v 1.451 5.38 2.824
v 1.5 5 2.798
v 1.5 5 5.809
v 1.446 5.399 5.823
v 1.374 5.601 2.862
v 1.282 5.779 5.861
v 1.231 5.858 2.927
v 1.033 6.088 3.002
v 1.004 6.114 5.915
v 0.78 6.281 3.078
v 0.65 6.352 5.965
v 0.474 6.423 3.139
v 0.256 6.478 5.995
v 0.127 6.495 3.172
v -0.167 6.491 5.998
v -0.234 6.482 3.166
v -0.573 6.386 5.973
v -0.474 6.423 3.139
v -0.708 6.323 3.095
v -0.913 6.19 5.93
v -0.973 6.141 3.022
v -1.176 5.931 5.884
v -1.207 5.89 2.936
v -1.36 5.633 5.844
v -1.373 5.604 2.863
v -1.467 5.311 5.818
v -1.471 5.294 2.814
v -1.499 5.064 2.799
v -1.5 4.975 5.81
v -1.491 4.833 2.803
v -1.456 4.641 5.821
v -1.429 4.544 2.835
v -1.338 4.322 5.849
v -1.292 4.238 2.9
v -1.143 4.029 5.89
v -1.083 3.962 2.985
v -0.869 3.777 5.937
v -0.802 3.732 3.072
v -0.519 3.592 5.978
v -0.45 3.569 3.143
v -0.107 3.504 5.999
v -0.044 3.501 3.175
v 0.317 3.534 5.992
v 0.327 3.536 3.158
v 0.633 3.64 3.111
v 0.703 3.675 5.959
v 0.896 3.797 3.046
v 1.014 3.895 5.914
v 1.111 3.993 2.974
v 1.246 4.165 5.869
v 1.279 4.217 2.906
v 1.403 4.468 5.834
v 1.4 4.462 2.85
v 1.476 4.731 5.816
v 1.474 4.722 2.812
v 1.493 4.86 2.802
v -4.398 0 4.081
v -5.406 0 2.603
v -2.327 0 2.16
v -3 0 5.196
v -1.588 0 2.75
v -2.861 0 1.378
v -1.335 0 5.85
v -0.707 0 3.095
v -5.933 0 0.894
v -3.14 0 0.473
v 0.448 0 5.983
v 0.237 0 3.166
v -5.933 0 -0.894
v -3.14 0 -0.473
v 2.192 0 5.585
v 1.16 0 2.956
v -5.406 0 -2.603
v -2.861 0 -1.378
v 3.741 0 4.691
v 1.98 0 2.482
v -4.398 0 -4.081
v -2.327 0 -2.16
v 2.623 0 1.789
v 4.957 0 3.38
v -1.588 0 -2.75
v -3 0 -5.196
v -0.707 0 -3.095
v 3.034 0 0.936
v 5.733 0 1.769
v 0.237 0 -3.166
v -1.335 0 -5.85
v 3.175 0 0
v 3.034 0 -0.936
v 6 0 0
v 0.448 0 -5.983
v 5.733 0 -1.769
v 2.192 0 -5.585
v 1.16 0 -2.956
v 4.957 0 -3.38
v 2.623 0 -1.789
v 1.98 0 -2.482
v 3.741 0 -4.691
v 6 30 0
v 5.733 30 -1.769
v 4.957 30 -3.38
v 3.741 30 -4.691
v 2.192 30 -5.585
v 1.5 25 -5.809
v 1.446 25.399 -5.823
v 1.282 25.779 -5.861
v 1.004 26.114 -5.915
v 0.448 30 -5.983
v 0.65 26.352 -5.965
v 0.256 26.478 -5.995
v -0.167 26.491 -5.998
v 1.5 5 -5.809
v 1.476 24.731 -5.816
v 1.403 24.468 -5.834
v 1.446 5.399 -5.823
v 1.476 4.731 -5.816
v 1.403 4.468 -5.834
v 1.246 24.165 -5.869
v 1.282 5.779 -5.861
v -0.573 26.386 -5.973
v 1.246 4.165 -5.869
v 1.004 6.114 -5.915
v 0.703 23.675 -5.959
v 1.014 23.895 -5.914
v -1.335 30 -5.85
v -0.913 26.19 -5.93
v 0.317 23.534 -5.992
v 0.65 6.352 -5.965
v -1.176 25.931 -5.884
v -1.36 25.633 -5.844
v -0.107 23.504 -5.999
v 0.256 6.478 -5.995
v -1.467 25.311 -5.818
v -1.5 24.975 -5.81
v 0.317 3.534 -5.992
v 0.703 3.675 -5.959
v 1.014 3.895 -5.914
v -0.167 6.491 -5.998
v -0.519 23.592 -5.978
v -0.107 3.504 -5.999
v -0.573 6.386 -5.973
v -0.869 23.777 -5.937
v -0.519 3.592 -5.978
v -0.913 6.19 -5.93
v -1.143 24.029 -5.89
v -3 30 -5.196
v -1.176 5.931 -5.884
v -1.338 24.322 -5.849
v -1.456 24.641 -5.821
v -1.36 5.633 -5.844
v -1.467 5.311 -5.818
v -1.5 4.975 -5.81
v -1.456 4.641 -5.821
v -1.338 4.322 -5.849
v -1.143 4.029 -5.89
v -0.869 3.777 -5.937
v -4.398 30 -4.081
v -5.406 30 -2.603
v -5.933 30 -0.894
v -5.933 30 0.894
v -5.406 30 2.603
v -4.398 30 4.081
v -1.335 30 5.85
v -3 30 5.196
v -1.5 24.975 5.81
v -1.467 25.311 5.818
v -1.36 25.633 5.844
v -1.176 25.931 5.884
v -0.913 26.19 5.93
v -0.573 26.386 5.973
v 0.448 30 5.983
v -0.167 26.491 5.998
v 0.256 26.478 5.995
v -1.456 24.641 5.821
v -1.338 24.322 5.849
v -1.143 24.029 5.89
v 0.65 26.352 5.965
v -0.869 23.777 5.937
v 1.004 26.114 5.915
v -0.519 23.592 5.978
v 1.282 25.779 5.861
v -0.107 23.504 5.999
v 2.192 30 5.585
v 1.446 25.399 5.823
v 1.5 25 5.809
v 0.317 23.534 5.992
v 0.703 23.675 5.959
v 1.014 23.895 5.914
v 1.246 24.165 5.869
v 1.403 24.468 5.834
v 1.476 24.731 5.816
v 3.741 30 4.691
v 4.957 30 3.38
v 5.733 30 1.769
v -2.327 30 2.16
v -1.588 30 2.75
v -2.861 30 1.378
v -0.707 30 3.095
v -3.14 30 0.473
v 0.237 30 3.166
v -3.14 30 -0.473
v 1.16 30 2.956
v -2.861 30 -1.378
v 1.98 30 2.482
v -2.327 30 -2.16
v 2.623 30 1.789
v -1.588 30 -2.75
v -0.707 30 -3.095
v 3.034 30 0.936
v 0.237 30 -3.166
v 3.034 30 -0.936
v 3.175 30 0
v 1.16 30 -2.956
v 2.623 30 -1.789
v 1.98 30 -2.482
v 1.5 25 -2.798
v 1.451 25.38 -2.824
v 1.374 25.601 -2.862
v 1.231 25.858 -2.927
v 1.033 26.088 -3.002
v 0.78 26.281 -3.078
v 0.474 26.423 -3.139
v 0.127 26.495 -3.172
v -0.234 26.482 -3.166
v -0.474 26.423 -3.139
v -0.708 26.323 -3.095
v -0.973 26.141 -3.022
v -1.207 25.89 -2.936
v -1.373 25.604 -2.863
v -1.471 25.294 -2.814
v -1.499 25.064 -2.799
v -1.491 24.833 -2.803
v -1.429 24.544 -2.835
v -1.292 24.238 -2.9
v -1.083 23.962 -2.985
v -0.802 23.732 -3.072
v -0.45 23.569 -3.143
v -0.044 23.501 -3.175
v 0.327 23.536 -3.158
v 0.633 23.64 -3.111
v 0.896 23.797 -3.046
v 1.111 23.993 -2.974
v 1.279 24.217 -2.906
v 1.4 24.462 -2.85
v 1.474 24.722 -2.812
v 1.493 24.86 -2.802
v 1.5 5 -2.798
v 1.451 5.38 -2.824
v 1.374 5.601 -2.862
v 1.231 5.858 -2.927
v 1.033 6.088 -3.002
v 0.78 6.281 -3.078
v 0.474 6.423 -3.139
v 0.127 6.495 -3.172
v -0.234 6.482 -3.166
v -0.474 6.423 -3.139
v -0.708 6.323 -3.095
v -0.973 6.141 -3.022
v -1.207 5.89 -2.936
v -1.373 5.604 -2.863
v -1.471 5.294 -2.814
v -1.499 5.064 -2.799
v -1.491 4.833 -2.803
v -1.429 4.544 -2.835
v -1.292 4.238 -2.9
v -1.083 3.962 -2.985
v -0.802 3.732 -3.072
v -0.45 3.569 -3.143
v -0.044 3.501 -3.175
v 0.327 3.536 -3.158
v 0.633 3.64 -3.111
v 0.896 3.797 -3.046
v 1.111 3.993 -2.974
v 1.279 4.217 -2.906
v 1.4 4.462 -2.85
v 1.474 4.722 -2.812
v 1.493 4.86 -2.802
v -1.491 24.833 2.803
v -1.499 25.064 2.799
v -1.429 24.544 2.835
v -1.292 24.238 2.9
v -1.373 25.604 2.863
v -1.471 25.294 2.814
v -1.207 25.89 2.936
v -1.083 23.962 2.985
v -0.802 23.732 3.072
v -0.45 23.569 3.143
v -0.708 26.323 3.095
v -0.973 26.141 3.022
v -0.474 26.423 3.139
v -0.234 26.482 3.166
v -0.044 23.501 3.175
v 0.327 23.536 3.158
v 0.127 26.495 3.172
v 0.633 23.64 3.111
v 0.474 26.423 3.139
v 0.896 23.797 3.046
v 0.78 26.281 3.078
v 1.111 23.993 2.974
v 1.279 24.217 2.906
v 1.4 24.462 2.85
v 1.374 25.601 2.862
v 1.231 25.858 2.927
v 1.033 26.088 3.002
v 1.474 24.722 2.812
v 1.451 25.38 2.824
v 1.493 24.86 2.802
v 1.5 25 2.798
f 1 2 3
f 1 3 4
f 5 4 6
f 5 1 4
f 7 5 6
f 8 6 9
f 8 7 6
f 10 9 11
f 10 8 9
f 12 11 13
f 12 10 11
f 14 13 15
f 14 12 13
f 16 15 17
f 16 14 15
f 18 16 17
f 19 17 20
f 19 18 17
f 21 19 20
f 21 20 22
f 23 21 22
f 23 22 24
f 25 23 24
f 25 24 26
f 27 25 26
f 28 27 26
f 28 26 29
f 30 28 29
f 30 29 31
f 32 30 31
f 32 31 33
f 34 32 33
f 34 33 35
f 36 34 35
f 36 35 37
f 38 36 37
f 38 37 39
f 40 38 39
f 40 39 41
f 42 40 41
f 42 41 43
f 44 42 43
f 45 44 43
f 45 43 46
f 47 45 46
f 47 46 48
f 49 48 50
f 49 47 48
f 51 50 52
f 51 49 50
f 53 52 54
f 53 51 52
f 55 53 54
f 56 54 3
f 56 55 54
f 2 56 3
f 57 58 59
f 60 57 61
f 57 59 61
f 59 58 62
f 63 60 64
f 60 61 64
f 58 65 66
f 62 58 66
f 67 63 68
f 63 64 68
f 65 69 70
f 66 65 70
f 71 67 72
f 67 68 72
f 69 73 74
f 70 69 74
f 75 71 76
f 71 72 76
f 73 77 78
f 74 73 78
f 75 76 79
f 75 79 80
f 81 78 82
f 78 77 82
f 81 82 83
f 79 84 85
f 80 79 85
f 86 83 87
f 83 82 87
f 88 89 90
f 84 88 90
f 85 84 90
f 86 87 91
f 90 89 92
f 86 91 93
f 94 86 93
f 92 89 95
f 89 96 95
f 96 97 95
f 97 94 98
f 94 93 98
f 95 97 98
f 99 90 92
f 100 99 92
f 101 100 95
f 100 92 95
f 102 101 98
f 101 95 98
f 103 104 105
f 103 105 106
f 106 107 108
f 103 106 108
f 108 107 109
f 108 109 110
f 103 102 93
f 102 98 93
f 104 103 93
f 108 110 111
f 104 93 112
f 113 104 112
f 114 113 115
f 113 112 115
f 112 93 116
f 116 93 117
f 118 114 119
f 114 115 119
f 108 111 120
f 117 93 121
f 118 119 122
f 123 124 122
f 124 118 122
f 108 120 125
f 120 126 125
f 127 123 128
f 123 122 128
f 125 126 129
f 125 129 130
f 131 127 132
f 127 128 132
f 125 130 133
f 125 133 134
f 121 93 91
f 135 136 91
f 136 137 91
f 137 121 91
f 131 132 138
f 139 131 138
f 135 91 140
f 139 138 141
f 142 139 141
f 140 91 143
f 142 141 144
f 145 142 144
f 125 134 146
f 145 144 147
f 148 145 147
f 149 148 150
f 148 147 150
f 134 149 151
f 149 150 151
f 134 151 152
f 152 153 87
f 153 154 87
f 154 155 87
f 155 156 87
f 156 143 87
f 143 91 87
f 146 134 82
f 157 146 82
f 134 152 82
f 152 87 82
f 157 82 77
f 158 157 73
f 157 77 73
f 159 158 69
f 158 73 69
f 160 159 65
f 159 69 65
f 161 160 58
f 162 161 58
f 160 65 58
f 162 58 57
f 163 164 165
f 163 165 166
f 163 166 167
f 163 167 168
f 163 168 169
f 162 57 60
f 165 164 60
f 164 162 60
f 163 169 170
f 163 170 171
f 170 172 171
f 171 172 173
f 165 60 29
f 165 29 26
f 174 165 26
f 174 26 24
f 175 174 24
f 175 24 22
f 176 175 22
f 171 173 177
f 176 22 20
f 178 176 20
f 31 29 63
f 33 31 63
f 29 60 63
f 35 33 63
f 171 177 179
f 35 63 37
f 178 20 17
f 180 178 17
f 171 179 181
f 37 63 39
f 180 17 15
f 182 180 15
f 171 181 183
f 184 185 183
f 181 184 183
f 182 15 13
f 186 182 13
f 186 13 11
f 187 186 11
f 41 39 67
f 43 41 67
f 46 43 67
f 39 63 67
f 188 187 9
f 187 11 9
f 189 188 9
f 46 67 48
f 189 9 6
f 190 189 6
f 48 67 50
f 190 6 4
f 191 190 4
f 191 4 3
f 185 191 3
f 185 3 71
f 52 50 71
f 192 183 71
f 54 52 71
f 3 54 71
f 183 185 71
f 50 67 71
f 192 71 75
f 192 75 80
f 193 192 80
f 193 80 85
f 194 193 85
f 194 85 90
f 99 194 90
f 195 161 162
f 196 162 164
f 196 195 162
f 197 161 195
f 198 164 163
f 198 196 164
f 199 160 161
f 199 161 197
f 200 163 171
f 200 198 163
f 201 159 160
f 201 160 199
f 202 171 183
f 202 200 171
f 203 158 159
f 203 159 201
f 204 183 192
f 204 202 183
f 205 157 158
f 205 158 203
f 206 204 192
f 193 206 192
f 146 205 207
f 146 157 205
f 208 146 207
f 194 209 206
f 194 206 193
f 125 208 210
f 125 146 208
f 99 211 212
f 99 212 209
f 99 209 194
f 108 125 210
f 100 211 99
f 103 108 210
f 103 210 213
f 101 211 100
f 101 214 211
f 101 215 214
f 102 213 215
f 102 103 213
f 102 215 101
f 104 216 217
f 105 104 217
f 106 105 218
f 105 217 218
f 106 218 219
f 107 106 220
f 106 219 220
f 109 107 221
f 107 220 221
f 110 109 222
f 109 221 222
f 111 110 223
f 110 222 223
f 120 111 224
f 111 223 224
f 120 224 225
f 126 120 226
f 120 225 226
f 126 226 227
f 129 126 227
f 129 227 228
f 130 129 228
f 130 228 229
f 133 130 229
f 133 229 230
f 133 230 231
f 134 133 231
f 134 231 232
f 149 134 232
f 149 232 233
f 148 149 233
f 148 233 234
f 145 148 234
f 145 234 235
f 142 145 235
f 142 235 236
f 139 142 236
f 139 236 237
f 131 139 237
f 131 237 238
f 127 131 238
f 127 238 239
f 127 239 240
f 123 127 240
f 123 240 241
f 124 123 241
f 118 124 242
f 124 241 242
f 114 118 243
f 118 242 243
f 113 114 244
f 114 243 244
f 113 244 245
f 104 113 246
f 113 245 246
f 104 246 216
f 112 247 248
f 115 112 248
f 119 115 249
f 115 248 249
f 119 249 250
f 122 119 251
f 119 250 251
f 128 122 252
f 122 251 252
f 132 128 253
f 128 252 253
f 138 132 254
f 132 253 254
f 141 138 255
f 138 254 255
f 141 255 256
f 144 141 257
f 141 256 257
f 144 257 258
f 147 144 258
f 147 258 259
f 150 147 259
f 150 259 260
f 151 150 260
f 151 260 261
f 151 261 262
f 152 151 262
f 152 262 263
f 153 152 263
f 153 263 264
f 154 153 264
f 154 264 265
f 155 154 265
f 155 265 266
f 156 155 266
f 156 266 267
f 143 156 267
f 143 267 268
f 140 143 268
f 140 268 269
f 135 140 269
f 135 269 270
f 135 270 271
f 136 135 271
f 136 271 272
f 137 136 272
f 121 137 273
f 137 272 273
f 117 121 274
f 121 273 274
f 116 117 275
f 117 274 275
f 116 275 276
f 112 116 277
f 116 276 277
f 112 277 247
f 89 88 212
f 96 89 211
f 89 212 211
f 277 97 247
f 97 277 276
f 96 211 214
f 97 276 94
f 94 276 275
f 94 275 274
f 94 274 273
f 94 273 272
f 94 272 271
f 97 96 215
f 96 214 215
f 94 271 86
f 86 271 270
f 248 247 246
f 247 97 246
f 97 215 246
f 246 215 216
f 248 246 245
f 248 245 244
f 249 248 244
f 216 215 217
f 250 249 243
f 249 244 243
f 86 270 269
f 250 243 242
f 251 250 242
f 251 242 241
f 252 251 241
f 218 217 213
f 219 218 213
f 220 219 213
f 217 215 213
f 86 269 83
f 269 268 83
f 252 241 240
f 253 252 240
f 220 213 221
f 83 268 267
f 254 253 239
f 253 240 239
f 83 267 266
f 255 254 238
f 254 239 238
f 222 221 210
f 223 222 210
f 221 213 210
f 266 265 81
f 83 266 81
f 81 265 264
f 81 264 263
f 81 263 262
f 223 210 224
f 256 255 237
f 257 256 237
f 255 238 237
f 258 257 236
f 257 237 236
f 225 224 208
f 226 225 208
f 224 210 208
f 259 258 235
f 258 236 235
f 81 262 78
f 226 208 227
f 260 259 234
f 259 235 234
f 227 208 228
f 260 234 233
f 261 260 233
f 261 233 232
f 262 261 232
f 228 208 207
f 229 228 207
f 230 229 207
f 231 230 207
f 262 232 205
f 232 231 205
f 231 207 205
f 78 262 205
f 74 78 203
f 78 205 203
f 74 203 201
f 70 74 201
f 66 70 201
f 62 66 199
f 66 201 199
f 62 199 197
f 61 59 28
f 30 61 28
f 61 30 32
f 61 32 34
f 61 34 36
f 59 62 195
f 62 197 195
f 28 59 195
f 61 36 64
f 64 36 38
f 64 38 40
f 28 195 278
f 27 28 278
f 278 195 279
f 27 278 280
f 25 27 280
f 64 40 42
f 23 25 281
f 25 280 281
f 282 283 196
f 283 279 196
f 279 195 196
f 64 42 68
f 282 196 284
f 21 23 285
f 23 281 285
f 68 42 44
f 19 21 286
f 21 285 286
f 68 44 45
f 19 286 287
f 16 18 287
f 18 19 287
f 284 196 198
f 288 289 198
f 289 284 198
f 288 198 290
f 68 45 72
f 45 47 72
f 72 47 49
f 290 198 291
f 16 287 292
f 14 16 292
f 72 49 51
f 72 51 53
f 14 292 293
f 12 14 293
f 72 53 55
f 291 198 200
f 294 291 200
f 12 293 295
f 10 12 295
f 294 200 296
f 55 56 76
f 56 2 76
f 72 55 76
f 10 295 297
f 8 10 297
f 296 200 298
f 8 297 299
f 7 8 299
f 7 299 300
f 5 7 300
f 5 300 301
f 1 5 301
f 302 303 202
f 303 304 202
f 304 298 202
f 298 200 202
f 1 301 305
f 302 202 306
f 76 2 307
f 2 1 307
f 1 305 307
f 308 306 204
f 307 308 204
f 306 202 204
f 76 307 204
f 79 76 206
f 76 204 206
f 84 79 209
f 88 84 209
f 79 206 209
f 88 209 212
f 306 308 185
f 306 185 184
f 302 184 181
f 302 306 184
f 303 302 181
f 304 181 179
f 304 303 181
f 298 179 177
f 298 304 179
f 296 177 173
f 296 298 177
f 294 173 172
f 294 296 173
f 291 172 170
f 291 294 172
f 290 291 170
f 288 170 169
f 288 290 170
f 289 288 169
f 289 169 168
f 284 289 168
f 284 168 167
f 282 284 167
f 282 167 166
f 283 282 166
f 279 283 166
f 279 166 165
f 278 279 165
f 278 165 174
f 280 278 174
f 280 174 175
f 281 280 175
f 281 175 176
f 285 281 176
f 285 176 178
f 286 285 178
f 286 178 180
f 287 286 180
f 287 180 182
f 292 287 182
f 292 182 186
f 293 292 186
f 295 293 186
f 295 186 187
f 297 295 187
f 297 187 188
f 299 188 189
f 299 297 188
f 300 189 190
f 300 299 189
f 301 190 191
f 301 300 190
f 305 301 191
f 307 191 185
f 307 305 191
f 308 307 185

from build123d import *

# Parameters (mm, degrees)
SKETCH1_R               = 6
BOSS_EXTRUDE1_DEPTH     = 30
SKETCH2_R               = 3.175
CUT_EXTRUDE1_DEPTH      = 1
CUT_EXTRUDE1_DEPTH_BACK = 31
SKETCH4_R               = 1.5
CUT_EXTRUDE4_DEPTH      = 7
CUT_EXTRUDE4_DEPTH_BACK = 7


with BuildPart() as part:
    # Sketch1 → Boss-Extrude1 (new body)
    with BuildSketch(Plane(origin=(0, 0, 0), x_dir=(1, 0, 0), z_dir=(0, 1, 0))):
        Circle(SKETCH1_R)
    extrude(amount=BOSS_EXTRUDE1_DEPTH)

    # Sketch2 → Cut-Extrude1 (cut, two sides)
    with BuildSketch(Plane(origin=(0, 30, 0), x_dir=(1, 0, 0), z_dir=(0, 1, 0))) as cut_extrude1_sk:
        Circle(SKETCH2_R)
    extrude(amount=CUT_EXTRUDE1_DEPTH, mode=Mode.SUBTRACT)
    extrude(cut_extrude1_sk.sketch, amount=-CUT_EXTRUDE1_DEPTH_BACK, mode=Mode.SUBTRACT)

    # Sketch4 → Cut-Extrude4 (cut, two sides)
    with BuildSketch(Plane.XY) as cut_extrude4_sk:
        with Locations((0, 25)):
            Circle(SKETCH4_R)
        with Locations((0, 5)):
            Circle(SKETCH4_R)
    extrude(amount=CUT_EXTRUDE4_DEPTH, mode=Mode.SUBTRACT)
    extrude(cut_extrude4_sk.sketch, amount=-CUT_EXTRUDE4_DEPTH_BACK, mode=Mode.SUBTRACT)


solid = part.part
